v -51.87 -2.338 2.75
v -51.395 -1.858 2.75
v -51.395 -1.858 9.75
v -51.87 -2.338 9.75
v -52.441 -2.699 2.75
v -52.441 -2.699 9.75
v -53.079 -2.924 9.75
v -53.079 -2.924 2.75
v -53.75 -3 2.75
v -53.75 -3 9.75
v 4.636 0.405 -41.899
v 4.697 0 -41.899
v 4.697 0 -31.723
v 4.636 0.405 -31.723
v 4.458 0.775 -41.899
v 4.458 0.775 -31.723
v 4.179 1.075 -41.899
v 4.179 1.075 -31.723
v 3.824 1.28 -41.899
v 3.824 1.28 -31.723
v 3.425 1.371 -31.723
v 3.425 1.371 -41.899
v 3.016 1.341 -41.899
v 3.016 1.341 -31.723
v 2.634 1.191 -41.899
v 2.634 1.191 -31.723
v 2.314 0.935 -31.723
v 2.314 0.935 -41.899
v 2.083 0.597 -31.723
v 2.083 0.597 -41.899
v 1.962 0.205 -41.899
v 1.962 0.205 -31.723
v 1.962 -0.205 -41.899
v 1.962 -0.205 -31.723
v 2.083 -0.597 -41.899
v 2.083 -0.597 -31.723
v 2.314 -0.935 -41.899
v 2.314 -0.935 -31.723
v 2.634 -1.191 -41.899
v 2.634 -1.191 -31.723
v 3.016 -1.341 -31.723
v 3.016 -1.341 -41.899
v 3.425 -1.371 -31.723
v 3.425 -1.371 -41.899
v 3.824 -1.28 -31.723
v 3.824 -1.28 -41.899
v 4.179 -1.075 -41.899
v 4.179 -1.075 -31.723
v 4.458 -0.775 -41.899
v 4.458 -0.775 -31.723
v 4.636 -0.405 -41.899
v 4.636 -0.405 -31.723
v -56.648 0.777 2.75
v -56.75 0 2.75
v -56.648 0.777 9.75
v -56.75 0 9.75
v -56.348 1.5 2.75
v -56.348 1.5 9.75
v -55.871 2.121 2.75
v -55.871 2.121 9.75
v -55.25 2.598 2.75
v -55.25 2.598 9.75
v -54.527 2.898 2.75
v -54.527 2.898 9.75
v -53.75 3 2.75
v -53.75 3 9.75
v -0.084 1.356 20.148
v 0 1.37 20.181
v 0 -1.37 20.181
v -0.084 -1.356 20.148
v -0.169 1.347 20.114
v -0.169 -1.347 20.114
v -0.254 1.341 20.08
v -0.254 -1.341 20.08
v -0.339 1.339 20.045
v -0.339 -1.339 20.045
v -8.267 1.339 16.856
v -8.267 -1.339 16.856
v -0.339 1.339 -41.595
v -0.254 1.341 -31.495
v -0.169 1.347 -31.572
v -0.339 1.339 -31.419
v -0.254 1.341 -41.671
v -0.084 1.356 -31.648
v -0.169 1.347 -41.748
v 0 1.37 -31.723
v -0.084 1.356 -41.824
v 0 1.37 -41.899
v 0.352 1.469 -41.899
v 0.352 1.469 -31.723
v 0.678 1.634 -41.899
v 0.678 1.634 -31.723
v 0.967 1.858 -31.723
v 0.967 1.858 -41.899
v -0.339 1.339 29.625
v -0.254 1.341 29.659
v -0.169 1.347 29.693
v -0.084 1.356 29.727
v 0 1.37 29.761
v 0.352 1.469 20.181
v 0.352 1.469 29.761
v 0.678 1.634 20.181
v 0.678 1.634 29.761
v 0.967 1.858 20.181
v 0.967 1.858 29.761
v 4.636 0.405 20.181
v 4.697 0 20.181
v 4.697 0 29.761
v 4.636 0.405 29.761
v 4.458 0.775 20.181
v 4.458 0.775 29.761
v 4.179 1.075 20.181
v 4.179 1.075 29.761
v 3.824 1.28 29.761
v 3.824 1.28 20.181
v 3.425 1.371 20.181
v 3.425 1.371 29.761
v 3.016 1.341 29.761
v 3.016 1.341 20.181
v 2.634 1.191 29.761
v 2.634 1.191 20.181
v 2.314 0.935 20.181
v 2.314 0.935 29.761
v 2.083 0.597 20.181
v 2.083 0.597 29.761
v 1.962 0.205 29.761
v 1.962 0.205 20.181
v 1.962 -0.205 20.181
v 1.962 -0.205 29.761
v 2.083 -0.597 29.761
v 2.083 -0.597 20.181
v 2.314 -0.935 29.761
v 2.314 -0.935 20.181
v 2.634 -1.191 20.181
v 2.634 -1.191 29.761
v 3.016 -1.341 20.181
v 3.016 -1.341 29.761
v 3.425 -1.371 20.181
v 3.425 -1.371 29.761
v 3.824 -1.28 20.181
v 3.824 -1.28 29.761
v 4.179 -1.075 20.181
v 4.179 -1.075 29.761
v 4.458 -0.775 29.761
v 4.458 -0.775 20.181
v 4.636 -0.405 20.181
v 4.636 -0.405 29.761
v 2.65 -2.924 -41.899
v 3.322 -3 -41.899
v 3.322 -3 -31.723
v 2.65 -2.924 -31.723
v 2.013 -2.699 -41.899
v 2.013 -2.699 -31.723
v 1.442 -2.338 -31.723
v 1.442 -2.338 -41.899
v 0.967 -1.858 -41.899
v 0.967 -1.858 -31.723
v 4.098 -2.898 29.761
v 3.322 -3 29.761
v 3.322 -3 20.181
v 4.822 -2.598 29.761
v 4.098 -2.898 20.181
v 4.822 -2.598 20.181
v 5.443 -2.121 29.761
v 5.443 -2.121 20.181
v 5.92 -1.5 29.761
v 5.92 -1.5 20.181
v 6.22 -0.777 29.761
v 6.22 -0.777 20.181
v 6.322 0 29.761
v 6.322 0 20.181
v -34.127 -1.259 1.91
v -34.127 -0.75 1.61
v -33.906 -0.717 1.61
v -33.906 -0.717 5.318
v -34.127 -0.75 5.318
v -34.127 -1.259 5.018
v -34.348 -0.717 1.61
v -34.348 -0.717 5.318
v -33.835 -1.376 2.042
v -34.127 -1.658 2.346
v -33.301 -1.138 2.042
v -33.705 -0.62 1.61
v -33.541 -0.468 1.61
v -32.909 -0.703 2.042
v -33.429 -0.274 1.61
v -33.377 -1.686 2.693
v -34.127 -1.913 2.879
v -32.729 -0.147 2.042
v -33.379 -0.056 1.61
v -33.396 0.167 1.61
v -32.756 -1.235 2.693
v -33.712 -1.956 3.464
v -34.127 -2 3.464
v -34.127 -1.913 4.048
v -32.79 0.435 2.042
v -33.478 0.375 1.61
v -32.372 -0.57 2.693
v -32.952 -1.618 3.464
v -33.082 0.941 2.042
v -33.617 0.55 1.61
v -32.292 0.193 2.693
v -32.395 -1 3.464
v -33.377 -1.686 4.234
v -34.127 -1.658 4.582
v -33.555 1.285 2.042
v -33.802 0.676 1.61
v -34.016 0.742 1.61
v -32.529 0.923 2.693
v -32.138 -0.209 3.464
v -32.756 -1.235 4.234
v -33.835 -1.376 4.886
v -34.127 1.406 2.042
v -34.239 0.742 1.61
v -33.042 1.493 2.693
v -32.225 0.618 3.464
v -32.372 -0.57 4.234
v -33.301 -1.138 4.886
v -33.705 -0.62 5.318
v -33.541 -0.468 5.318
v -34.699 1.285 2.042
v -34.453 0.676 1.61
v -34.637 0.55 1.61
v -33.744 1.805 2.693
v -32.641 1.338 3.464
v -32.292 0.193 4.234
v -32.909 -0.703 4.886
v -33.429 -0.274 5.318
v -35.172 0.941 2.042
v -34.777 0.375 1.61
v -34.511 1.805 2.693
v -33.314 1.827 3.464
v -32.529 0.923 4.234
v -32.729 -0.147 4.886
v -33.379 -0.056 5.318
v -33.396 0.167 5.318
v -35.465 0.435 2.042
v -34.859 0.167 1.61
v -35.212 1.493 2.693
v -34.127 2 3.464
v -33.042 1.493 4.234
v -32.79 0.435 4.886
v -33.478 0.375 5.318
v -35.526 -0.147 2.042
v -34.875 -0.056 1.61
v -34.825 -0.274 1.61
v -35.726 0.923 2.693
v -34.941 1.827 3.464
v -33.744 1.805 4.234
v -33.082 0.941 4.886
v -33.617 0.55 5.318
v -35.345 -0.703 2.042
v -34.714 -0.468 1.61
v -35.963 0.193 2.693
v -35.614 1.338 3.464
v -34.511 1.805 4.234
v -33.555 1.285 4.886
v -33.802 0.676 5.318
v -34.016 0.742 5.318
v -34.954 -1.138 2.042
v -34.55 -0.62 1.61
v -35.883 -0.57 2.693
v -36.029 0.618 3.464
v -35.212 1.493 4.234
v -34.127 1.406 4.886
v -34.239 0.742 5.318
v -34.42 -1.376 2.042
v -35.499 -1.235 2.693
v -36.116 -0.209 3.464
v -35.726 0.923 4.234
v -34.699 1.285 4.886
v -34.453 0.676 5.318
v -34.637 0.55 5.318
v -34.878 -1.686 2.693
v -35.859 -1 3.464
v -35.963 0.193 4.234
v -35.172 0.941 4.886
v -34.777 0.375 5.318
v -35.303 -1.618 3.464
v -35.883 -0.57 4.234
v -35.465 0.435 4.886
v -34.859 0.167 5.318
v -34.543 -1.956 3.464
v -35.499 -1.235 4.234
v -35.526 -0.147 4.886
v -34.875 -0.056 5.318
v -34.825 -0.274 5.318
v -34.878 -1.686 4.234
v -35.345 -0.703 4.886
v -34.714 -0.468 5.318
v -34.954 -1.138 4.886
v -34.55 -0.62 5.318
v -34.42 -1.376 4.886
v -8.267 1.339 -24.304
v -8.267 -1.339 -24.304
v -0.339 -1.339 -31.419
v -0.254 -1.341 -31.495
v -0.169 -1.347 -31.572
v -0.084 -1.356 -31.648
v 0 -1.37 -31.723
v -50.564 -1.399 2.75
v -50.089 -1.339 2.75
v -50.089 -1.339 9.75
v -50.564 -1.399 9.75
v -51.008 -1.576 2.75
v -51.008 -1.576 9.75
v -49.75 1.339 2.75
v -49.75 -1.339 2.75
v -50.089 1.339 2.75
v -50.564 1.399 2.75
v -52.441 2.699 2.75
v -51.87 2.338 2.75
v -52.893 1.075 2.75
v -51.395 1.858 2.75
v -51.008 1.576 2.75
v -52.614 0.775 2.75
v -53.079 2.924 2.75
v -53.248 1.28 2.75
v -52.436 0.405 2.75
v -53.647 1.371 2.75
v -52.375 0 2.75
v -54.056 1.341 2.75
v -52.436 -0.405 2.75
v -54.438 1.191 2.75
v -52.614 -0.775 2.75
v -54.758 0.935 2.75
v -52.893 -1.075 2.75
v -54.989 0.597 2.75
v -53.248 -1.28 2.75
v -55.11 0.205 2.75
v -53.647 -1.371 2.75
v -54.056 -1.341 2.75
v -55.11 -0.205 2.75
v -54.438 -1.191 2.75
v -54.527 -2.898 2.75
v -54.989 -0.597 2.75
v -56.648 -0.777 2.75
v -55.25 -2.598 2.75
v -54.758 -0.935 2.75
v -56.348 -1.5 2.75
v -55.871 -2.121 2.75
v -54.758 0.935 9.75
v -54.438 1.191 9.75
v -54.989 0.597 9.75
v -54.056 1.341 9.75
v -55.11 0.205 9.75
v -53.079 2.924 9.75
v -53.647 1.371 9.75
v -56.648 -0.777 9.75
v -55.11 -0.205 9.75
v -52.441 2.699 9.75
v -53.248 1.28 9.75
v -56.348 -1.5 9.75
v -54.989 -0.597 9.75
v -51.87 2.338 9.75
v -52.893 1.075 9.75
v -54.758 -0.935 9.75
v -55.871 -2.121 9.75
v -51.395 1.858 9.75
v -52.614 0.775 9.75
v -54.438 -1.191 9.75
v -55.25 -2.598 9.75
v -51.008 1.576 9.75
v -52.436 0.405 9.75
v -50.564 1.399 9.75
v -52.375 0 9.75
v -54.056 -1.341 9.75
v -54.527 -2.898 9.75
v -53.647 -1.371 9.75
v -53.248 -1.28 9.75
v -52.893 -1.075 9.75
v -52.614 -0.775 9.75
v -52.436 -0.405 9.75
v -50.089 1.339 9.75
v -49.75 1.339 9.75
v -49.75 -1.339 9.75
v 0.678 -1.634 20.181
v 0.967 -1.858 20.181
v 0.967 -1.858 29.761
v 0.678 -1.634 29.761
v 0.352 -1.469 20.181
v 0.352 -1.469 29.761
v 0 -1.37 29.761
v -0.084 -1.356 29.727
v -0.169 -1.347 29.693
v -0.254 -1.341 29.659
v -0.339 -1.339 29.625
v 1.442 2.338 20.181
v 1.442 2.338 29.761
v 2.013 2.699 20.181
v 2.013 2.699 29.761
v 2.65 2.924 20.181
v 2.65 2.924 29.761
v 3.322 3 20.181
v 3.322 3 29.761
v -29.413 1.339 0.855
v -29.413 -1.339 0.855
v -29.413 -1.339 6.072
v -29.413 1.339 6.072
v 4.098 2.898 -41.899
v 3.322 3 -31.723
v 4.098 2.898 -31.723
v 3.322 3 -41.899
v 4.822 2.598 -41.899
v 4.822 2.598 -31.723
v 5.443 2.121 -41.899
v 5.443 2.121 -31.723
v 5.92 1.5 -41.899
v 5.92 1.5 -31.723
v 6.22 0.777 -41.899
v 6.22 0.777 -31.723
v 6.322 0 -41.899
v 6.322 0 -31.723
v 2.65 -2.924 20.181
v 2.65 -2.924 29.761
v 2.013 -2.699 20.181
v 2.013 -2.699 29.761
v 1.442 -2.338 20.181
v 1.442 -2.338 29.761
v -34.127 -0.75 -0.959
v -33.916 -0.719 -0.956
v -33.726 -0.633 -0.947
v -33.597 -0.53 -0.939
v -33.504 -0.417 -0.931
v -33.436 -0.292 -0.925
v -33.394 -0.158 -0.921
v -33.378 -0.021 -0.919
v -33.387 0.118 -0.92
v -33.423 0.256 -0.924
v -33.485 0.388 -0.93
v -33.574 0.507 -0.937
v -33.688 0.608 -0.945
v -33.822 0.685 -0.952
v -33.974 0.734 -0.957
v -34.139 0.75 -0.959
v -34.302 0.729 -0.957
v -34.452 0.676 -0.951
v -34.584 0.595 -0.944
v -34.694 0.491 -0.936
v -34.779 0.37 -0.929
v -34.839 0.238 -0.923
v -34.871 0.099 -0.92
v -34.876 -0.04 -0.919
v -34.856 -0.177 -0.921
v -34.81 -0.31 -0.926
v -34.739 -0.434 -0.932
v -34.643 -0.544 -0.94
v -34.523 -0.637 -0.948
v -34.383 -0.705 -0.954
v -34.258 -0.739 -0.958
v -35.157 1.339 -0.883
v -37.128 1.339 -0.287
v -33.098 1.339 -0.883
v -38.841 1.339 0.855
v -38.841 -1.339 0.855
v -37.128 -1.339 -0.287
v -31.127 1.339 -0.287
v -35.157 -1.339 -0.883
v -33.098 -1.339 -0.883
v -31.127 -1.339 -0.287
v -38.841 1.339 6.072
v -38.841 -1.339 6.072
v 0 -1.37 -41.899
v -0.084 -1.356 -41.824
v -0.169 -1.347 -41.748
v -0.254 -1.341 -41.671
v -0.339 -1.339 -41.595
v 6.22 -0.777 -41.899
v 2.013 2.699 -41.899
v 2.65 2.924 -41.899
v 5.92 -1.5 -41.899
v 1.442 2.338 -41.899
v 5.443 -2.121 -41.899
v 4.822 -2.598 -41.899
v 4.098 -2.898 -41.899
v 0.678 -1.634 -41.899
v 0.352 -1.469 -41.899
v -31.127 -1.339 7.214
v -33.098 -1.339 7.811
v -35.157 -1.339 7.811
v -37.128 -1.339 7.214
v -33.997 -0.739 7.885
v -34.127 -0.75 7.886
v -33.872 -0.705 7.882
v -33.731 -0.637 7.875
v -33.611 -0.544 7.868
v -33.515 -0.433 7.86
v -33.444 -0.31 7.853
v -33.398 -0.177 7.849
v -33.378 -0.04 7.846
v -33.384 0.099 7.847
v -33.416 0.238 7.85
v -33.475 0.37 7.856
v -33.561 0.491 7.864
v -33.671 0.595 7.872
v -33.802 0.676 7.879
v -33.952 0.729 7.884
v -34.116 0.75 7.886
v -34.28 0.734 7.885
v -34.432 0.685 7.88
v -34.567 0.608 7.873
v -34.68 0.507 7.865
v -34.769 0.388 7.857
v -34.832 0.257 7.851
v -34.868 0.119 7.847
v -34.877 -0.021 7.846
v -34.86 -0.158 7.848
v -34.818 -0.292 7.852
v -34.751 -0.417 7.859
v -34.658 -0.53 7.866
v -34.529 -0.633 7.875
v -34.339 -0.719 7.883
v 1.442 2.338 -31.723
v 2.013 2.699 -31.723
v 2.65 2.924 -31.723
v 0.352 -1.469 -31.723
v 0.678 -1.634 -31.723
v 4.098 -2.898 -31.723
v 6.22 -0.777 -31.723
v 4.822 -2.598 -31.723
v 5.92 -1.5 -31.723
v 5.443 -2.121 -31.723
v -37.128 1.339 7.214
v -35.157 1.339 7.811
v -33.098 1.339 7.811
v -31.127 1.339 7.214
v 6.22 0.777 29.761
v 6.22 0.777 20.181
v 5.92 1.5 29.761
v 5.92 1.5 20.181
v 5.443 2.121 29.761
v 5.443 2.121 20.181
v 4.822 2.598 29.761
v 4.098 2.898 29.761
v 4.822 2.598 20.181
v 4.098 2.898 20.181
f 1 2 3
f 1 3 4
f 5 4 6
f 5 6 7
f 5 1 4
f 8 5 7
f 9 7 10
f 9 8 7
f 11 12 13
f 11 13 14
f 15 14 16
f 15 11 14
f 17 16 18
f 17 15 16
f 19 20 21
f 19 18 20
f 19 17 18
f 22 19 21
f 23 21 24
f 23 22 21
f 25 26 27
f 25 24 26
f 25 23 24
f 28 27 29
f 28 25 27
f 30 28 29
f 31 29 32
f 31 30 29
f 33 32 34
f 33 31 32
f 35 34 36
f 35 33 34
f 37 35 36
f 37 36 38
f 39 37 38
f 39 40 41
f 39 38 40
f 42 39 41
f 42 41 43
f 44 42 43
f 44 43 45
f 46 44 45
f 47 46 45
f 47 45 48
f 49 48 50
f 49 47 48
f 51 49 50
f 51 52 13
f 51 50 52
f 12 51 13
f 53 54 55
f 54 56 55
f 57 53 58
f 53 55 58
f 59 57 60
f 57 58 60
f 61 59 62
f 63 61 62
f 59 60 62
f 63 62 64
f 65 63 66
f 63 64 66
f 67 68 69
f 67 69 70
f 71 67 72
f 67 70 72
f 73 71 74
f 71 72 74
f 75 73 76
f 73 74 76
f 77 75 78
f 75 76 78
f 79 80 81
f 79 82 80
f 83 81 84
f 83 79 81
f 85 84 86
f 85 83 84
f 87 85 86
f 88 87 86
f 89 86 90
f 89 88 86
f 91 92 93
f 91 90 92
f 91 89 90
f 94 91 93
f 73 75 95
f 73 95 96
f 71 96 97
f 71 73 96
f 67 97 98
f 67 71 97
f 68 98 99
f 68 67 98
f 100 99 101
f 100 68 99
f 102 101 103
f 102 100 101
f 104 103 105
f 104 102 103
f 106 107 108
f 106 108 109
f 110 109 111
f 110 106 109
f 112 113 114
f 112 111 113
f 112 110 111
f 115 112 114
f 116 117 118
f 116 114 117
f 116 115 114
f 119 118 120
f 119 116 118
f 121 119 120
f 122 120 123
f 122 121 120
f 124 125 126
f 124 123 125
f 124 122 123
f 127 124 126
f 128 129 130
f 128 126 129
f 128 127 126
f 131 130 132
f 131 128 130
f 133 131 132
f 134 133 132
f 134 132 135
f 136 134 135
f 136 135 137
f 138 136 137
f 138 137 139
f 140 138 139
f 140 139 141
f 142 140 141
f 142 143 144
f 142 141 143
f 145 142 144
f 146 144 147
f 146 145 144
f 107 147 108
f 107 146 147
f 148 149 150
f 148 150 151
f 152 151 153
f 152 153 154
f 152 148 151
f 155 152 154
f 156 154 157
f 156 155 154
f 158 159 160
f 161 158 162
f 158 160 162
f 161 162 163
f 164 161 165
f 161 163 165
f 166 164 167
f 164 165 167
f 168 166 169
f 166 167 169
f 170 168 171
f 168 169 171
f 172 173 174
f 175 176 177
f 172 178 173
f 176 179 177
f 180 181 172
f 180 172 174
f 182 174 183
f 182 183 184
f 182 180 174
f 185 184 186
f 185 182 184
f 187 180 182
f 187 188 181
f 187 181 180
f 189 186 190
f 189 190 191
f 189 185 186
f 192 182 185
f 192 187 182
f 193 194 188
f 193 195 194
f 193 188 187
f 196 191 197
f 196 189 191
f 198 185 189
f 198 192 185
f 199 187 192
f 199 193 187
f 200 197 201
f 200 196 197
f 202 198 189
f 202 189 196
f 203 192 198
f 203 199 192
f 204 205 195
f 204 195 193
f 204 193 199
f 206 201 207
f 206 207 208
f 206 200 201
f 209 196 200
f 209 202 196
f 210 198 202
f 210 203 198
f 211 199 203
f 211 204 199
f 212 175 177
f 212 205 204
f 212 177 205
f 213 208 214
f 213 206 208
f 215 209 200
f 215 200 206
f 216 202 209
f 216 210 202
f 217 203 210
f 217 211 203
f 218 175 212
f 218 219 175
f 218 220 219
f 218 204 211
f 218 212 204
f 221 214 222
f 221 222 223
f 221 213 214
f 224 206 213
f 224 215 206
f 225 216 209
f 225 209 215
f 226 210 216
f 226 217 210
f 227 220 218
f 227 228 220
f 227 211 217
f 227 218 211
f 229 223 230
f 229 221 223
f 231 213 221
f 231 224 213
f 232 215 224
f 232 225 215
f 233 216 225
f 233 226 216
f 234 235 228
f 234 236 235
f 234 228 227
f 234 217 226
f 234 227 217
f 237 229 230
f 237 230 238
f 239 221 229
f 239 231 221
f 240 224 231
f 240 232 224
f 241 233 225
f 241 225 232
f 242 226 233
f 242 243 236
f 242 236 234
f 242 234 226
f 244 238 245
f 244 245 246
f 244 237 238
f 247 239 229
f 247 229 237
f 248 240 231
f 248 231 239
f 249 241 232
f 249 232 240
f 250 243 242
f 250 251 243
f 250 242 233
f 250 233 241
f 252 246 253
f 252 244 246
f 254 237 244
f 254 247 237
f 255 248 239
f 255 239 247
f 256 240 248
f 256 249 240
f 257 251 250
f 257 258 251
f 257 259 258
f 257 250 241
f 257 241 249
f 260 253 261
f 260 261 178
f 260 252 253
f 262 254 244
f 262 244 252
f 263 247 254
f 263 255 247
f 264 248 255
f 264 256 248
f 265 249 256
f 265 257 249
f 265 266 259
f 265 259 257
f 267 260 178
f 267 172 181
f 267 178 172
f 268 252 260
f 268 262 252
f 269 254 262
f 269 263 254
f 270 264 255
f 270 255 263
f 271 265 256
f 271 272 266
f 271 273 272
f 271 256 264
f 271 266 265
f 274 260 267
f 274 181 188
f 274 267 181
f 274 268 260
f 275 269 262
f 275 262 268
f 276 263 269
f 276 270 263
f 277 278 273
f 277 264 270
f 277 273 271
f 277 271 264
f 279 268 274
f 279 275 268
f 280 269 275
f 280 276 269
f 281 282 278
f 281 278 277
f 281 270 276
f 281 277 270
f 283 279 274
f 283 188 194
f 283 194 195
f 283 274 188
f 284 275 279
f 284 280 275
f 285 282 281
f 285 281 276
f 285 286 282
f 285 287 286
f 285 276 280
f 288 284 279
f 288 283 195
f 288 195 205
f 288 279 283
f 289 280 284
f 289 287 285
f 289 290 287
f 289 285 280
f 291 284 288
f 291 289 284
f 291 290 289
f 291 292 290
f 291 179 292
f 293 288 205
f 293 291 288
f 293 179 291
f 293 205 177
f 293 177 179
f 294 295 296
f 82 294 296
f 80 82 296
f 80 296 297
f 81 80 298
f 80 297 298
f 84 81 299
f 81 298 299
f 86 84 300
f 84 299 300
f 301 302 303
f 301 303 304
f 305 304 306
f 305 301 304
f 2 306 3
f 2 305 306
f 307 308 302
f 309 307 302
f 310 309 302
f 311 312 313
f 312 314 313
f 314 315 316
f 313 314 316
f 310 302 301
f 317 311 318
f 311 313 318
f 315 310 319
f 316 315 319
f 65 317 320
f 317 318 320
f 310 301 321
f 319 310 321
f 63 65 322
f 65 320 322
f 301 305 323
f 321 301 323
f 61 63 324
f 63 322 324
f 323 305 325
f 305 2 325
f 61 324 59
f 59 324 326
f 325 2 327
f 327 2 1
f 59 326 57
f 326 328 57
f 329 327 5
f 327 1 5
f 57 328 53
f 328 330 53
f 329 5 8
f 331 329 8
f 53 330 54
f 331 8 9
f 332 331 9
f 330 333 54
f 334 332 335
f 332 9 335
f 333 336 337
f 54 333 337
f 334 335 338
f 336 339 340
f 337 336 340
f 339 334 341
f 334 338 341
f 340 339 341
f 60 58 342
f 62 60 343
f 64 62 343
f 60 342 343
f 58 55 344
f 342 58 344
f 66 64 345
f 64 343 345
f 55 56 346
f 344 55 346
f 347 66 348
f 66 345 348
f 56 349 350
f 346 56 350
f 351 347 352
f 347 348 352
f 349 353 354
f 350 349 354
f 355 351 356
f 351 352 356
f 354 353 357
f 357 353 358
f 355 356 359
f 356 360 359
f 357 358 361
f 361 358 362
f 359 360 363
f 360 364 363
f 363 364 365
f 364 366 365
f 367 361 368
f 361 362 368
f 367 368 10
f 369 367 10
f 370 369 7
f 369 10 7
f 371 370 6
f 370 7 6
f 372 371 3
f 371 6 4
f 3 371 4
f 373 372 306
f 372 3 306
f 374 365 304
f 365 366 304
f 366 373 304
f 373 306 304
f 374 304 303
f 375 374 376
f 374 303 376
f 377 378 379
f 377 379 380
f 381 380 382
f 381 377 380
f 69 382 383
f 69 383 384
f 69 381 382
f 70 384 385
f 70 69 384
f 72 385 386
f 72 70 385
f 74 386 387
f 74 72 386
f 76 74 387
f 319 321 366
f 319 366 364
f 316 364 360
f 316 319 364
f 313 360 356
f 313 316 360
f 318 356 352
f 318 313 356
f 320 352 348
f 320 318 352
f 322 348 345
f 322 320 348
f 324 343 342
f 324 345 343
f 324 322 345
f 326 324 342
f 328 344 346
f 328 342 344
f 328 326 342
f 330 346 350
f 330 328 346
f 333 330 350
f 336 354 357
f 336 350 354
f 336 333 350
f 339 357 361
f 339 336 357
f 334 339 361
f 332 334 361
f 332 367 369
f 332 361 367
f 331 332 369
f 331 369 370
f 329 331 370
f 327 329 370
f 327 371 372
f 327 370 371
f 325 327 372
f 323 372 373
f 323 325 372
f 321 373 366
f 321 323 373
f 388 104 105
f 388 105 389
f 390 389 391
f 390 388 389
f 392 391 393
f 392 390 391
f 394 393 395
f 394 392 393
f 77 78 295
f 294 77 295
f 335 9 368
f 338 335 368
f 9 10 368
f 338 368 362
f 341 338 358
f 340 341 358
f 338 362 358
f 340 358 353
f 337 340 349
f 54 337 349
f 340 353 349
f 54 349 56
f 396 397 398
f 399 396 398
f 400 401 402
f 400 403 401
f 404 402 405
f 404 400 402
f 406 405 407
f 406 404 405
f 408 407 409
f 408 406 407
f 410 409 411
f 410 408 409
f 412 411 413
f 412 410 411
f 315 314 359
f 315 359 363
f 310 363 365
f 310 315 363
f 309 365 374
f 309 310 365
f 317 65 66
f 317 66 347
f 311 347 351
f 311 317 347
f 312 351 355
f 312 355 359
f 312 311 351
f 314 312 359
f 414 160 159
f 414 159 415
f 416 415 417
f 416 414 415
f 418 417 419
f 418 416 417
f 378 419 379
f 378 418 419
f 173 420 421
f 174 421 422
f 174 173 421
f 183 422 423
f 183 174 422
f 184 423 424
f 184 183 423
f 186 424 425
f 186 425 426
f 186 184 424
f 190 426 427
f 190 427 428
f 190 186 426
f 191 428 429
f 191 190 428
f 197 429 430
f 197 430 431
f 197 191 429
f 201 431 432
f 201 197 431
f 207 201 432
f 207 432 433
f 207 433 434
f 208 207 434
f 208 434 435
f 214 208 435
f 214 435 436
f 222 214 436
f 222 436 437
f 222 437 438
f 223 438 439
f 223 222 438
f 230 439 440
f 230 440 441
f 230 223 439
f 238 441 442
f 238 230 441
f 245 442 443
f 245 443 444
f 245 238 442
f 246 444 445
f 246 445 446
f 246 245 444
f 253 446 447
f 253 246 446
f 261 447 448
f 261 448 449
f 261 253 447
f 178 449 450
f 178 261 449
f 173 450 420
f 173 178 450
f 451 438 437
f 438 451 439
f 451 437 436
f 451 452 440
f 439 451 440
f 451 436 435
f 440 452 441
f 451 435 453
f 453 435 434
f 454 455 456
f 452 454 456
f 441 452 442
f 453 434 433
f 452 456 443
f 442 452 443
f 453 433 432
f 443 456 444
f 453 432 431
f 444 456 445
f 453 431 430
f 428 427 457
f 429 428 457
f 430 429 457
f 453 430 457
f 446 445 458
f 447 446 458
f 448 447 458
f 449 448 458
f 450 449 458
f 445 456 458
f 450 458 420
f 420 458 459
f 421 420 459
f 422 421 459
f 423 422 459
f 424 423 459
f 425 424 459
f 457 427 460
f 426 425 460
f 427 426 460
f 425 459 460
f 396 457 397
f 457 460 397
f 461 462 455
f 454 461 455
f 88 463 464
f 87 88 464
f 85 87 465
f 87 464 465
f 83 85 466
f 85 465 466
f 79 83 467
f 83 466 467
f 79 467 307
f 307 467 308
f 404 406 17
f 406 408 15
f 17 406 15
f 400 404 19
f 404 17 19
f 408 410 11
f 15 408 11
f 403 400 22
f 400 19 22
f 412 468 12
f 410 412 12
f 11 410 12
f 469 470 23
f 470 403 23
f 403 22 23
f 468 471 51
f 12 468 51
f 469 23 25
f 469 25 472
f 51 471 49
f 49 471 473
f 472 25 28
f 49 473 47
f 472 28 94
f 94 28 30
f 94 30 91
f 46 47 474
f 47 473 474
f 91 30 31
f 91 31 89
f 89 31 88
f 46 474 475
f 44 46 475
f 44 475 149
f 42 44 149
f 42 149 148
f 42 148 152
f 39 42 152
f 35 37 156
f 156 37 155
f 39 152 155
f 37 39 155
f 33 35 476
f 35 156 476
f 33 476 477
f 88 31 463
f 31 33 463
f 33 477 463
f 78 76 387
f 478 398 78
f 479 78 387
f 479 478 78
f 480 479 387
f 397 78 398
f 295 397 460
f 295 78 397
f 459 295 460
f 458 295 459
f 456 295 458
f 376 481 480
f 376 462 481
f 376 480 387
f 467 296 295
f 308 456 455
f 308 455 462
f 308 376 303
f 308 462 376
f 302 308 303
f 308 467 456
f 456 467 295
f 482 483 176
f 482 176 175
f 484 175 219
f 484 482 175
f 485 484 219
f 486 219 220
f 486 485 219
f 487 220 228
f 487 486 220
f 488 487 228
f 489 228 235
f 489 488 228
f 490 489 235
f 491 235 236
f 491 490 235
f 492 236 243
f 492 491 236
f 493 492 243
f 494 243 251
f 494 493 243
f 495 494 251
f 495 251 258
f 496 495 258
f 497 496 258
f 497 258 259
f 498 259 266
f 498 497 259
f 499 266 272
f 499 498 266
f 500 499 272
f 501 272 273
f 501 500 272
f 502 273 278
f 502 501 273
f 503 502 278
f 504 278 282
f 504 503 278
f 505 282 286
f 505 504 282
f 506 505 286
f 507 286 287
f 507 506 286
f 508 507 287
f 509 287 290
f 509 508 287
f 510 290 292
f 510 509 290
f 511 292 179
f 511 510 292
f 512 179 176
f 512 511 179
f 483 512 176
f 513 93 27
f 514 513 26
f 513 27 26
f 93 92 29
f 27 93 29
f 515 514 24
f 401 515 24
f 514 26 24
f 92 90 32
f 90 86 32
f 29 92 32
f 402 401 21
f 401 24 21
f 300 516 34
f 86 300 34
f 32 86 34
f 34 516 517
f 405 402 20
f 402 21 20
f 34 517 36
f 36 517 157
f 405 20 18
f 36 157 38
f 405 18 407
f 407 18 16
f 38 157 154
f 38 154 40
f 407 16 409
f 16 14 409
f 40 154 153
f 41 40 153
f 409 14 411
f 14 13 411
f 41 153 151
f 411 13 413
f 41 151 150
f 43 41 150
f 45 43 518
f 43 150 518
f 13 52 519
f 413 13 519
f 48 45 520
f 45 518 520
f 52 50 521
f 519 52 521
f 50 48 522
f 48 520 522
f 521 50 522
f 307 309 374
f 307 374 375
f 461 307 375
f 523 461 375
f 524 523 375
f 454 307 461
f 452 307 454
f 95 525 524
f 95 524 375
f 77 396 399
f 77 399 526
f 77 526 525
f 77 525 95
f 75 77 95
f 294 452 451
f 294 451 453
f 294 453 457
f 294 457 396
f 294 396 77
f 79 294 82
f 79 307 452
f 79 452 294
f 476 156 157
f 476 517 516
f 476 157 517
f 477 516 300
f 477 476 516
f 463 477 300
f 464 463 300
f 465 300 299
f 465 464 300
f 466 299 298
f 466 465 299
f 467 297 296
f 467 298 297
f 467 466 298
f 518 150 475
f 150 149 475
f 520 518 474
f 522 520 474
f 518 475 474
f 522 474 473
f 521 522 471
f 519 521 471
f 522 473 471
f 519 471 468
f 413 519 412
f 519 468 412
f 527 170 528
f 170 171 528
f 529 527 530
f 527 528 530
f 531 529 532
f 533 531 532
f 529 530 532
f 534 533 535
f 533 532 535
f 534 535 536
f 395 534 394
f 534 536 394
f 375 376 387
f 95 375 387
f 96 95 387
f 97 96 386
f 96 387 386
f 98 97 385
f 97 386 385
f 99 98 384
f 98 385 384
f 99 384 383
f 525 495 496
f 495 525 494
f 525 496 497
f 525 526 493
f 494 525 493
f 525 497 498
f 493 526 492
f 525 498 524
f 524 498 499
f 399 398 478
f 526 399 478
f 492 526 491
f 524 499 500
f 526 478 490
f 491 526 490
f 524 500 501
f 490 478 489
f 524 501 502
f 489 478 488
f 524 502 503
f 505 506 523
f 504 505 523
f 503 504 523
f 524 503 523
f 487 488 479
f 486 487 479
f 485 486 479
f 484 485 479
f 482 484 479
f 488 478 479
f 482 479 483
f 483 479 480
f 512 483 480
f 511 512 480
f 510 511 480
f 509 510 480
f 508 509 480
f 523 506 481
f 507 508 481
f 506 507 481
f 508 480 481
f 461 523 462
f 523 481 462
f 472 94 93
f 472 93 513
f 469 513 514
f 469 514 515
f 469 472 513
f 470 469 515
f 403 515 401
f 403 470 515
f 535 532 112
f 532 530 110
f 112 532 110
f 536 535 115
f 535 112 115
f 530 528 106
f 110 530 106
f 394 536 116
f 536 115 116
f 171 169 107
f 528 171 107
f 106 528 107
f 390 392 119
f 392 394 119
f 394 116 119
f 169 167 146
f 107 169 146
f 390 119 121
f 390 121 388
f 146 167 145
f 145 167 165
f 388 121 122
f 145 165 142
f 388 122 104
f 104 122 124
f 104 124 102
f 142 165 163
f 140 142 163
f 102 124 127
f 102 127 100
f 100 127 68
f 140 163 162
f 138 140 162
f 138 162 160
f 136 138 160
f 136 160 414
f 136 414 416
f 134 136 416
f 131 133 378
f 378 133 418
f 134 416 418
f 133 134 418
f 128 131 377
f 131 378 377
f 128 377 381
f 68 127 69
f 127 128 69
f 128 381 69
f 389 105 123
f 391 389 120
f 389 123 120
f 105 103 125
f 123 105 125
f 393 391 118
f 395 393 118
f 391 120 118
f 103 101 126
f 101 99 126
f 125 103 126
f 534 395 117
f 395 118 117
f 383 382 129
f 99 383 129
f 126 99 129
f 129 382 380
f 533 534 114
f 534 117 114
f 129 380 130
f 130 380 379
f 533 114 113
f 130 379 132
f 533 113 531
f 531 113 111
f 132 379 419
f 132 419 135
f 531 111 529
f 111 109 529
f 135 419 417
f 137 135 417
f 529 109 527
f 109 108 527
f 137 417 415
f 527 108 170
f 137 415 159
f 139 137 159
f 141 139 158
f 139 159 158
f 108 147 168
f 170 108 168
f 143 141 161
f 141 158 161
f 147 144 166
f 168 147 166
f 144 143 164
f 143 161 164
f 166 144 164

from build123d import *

# Parameters (mm, degrees)
BOSS_EXTRUDE1_DEPTH      = 3
BOSS_EXTRUDE1_DEPTH_BACK = 3
CUT_EXTRUDE1_DEPTH       = 77.793105304
CUT_EXTRUDE1_DEPTH_BACK  = 77.793105304
SKETCH2_R                = 1.375
FILLET2_R                = 3


with BuildPart() as part:
    # Sketch1 → Boss-Extrude1 (new, two sides: drawn at the far end of the back side and taken through both)
    with BuildSketch(Plane(origin=(0, 0, 0), x_dir=(1, 0, 0), z_dir=(0, 1, 0)).offset(-BOSS_EXTRUDE1_DEPTH_BACK)):
        Polygon((0, 41.898993428), (-49.75, -2.75), (-56.75, -2.75), (-56.75, -9.75), (-49.75, -9.75), (0, -29.761006572), (6.321904272, -29.761006572), (6.321904272, -20.181495095), (0, -20.181495095), (-8.267104031, -16.856207194), (-8.267104031, 24.303580089), (0, 31.723034833), (6.321904272, 31.723034833), (6.321904272, 41.898993428), align=None)
        with BuildLine():
            Line((-38.84115752, -6.072372844), (-38.84115752, -0.855123784))
            ThreePointArc((-38.84115752, -0.855123784), (-34.127327229, 0.958977223), (-29.413496938, -0.855123784))
            Line((-29.413496938, -0.855123784), (-29.413496938, -6.072372844))
            ThreePointArc((-29.413496938, -6.072372844), (-34.127327229, -7.886473851), (-38.84115752, -6.072372844))
        make_face(mode=Mode.SUBTRACT)
    extrude(amount=BOSS_EXTRUDE1_DEPTH + BOSS_EXTRUDE1_DEPTH_BACK)

    # Sketch2 → Cut-Extrude1 (cut, two sides: drawn at the far end of the back side and taken through both)
    with BuildSketch(Plane.XY.offset(9.75).offset(-CUT_EXTRUDE1_DEPTH_BACK)):
        with Locations((-53.75, 0)):
            Circle(SKETCH2_R)
        with Locations((3.321904272, 0)):
            Circle(SKETCH2_R)
        with BuildLine():
            Line((-53.75, -3), (-53.75, -4.40506942))
            Line((-53.75, -4.40506942), (3.321904272, -4.40506942))
            Line((3.321904272, -4.40506942), (3.321904272, -3))
            ThreePointArc((3.321904272, -3), (2.013077646, -2.699439361), (0.966505531, -1.857981908))
            ThreePointArc((0.966505531, -1.857981908), (0.3635922, -1.473684928), (-0.338629648, -1.339248585))
            Line((-0.338629648, -1.339248585), (-50.08946608, -1.339248585))
            ThreePointArc((-50.08946608, -1.339248585), (-50.791687928, -1.473684928), (-51.394601259, -1.857981908))
            ThreePointArc((-51.394601259, -1.857981908), (-52.441173374, -2.699439361), (-53.75, -3))
        make_face()
        with BuildLine():
            Line((3.321904272, 3), (3.321904272, 4.40506942))
            Line((3.321904272, 4.40506942), (-53.75, 4.40506942))
            Line((-53.75, 4.40506942), (-53.75, 3))
            ThreePointArc((-53.75, 3), (-52.441173374, 2.699439361), (-51.394601259, 1.857981908))
            ThreePointArc((-51.394601259, 1.857981908), (-50.791687928, 1.473684928), (-50.08946608, 1.339248585))
            Line((-50.08946608, 1.339248585), (-0.338629648, 1.339248585))
            ThreePointArc((-0.338629648, 1.339248585), (0.3635922, 1.473684928), (0.966505531, 1.857981908))
            ThreePointArc((0.966505531, 1.857981908), (2.013077646, 2.699439361), (3.321904272, 3))
        make_face()
    extrude(amount=CUT_EXTRUDE1_DEPTH + CUT_EXTRUDE1_DEPTH_BACK, mode=Mode.SUBTRACT)

    # Fillet2
    fillet2_edges = [part.edges().sort_by_distance(p)[0] for p in [
        (6.321904272, 3, -36.811014131),
        (6.321904272, -3, -36.811014131),
        (6.321904272, -3, 24.971250833),
        (6.321904272, 3, 24.971250833),
        (-56.75, -3, 6.25),
        (-56.75, 3, 6.25),
    ]]
    fillet(fillet2_edges, radius=FILLET2_R - 0.0001)  # a hair under: the kernel refuses the full size

    # Sketch3 → Revolve1 (revolve)
    with BuildSketch(Plane(origin=(0, 0, 0), x_dir=(1, 0, 0), z_dir=(0, 1, 0)), mode=Mode.PRIVATE) as revolve1_sk:
        with BuildLine():
            Line((-34.127327229, 0.958977223), (-33.377327229, 0.958977223))
            Line((-33.377327229, 0.958977223), (-33.377327229, -1.609698692))
            ThreePointArc((-33.377327229, -1.609698692), (-32.127327229, -3.463748314), (-33.377327229, -5.317797935))
            Line((-33.377327229, -5.317797935), (-33.377327229, -7.886473851))
            Line((-33.377327229, -7.886473851), (-34.127327229, -7.886473851))
            Line((-34.127327229, -7.886473851), (-34.127327229, 0.958977223))
        make_face()
    revolve(revolve1_sk.sketch.rotate(Axis((-34.127327229, 0, -0.958977223), (0, 0, 1)), 270), axis=Axis((-34.127327229, 0, -0.958977223), (0, 0, 1)))


solid = part.part
